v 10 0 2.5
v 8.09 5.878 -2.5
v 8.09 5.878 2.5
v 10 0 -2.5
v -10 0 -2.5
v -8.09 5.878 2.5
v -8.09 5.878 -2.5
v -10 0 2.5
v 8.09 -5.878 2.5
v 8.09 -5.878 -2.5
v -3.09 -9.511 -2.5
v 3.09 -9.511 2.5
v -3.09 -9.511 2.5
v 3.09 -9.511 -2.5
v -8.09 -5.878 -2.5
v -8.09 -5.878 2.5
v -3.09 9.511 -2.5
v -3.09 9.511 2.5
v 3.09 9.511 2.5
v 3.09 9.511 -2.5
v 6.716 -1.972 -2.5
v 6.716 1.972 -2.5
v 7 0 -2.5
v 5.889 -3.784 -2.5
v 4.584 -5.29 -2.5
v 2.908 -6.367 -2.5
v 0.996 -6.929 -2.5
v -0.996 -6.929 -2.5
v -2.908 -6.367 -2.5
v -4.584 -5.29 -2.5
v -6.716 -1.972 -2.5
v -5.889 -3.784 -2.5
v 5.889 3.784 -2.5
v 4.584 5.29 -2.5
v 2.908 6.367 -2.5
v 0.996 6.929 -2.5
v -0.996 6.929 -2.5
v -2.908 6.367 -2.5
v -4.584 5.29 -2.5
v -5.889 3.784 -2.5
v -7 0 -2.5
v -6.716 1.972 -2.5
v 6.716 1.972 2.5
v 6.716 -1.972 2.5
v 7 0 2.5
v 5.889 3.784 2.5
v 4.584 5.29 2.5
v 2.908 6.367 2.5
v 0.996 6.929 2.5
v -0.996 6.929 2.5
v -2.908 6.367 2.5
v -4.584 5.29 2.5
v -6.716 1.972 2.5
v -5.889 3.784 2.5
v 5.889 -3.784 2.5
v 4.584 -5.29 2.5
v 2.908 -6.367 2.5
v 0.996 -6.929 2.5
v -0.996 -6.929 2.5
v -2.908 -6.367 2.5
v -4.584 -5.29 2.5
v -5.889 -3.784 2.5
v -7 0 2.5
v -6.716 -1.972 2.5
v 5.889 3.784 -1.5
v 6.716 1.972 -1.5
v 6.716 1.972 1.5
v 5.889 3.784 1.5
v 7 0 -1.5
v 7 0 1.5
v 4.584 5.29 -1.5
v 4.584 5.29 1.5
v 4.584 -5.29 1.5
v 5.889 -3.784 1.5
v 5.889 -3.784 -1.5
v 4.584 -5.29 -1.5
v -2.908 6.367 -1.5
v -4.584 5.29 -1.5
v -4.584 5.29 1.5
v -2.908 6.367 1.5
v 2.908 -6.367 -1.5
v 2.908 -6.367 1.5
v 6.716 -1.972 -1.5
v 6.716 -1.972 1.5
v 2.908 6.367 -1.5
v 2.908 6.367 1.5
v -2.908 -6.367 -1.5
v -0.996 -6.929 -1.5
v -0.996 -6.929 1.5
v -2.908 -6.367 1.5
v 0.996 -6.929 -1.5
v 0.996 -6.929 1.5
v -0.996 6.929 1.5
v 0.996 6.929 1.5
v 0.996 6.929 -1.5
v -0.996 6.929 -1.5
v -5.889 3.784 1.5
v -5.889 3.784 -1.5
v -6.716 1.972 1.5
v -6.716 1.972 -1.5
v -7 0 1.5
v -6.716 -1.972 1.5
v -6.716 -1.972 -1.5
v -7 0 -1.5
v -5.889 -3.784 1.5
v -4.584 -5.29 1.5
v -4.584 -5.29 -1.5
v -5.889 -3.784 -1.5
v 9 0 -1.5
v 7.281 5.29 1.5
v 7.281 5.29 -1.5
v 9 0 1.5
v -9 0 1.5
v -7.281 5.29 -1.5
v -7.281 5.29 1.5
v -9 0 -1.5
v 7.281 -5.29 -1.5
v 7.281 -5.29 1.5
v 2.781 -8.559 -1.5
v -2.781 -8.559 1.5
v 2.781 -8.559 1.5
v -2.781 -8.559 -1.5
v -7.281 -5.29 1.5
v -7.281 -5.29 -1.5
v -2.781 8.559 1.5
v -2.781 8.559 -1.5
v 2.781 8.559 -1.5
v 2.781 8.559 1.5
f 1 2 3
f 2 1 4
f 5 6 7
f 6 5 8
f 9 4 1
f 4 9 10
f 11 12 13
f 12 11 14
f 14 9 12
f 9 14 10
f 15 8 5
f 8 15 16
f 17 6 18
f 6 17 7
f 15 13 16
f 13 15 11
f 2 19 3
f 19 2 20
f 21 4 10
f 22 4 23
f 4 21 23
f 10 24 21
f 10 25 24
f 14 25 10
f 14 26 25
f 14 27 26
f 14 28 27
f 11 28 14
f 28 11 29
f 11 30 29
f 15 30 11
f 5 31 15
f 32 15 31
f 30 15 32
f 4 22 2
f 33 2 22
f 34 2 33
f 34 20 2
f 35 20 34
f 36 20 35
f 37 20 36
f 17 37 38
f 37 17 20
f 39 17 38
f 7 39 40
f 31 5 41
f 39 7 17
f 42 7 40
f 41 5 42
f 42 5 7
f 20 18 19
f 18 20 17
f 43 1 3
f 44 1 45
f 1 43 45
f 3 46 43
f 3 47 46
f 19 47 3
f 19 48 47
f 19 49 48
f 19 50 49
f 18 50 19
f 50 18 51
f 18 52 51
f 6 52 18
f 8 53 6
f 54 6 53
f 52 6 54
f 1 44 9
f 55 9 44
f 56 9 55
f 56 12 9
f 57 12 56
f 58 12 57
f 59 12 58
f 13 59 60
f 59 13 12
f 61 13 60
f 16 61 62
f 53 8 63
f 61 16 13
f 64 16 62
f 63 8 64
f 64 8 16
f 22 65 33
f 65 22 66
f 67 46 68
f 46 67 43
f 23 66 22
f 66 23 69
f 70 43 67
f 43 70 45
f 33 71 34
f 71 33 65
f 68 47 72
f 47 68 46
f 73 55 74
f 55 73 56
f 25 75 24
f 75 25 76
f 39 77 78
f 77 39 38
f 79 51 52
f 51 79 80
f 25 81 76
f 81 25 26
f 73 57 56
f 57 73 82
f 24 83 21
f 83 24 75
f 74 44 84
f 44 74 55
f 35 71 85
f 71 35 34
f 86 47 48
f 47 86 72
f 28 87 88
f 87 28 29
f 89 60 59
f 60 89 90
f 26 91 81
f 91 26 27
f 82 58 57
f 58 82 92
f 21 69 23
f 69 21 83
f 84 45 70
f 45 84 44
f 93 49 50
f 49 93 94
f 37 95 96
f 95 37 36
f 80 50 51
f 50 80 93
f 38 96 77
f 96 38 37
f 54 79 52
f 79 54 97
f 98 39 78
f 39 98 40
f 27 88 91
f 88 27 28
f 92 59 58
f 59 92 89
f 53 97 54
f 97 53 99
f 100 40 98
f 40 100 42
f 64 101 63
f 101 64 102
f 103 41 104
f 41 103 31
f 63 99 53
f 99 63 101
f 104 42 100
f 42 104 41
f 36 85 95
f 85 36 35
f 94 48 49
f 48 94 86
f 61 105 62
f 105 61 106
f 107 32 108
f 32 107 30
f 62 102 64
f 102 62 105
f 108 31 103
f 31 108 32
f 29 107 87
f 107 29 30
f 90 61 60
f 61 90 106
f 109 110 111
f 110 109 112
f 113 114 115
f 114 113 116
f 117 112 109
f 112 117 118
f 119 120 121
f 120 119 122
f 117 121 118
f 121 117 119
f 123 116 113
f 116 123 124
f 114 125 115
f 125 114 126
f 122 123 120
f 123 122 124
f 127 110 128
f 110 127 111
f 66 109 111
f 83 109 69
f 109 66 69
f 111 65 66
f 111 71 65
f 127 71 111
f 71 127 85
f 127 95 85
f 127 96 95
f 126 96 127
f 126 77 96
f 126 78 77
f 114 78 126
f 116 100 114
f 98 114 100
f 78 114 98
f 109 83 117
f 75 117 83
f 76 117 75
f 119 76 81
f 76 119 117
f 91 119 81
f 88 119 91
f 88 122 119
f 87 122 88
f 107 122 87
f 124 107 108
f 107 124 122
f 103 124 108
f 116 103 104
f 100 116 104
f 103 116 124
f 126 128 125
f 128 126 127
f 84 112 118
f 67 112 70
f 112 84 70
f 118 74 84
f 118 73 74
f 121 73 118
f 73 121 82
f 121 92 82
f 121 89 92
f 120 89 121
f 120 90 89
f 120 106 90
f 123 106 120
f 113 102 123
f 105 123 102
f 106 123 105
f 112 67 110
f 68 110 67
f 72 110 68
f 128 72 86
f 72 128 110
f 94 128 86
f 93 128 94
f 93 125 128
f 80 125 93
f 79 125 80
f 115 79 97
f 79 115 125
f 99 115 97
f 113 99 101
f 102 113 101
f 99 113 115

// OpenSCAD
// Cryptex Disc Model


// polygonal-based prism defition
module ngonPrism(n, r, h) {
    linear_extrude(height = h, center=true) 
        polygon([
            for (i=[0:n-1], a=i*360/n) 
                [ r*cos(a), r*sin(a) ]
        ]);
}


module cryptexDisc(inner_radius, outer_radius, width, thickness){
    difference(){
        difference(){
            ngonPrism(n, outer_radius, width);
            cylinder(h=width, r=inner_radius, center=true);
        };
        ngonPrism(n, outer_radius-thickness, width-2*thickness);
    }
}




// Main Model
n = 10;

inner_radius = 7;
outer_radius = 10;
width = 5;
thickness = 1;

cryptexDisc(inner_radius, outer_radius, width, thickness);
